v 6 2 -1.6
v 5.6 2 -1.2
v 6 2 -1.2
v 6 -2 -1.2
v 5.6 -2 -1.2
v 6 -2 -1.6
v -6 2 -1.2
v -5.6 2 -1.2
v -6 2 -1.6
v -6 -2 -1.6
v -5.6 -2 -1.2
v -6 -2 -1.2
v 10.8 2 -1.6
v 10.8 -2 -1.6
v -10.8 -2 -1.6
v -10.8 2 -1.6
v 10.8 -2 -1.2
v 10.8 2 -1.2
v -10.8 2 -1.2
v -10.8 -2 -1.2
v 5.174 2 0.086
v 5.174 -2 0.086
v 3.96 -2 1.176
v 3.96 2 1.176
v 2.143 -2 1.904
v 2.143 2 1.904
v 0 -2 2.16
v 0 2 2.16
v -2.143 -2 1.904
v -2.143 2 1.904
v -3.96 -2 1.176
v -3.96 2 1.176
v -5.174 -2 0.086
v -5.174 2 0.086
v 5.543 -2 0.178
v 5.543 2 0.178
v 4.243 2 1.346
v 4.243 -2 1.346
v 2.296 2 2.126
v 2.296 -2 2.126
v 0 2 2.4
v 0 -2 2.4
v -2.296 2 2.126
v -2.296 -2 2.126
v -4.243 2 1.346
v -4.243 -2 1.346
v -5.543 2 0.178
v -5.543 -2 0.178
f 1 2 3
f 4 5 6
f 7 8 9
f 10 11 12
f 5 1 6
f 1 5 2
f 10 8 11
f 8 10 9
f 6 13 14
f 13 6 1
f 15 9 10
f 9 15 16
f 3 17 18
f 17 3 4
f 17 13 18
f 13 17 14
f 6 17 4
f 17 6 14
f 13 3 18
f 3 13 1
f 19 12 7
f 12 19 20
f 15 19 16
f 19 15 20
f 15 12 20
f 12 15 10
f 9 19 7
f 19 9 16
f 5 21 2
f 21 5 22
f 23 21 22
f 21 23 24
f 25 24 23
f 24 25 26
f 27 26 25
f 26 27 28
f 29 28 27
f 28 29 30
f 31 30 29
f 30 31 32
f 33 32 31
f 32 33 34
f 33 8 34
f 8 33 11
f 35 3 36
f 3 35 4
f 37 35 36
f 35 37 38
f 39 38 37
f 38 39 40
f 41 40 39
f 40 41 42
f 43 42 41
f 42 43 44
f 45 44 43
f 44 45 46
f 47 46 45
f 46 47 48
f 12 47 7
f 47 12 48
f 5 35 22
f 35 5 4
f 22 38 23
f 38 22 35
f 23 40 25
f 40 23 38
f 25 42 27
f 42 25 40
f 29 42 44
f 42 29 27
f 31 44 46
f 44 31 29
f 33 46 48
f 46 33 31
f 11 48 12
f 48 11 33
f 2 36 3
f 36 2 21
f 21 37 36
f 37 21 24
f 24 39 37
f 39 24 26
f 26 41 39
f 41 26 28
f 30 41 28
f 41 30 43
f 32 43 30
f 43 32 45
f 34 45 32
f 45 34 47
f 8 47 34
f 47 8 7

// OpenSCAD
// file: ../../p/box4-4a.scad
use <../lib.scad>
function ldraw_lib__box4_4a() = [
// 0 Box with  4 Faces without  4 Adjacent Edges
// 0 Name: box4-4a.dat
// 0 Author: Willy Tschager [Holly-Wood]
// 0 !LDRAW_ORG Primitive UPDATE 2024-01
// 0 !LICENSE Licensed under CC BY 4.0 : see CAreadme.txt
// 
// 0 BFC CERTIFY CCW
  [0,"BFC","CERTIFY"],
  [0,"BFC","CCW"],
// 
// 0 !HISTORY 1998-07-15 [PTadmin] Official Update 1998-07
// 0 !HISTORY 2002-12-13 [hafhead] Made BFC compliant
// 0 !HISTORY 2003-03-12 [PTadmin] Official Update 2003-01
// 0 !HISTORY 2007-06-24 [PTadmin] Header formatted for Contributor Agreement
// 0 !HISTORY 2008-07-01 [PTadmin] Official Update 2008-01
// 0 !HISTORY 2012-02-16 [Philo] Changed to CCW
// 0 !HISTORY 2012-03-30 [PTadmin] Official Update 2012-01
// 0 !HISTORY 2024-01-03 [Holly-Wood] Complete re-write, original by Manfred Moolhuysen
// 0 !HISTORY 2024-01-29 [OrionP] Official Update 2024-01
// 
// 2 24 -1 1 -1 -1 1 1
  [2,24,-1,1,-1,-1,1,1],
// 2 24 1 1 1 1 1 -1
  [2,24,1,1,1,1,1,-1],
// 2 24 -1 1 1 1 1 1
  [2,24,-1,1,1,1,1,1],
// 4 16 1 1 1 1 1 -1 -1 1 -1 -1 1 1
  [4,16,1,1,1,1,1,-1,-1,1,-1,-1,1,1],
// 
// 2 24 -1 0 -1 -1 0 1
  [2,24,-1,0,-1,-1,0,1],
// 4 16 -1 1 1 -1 1 -1 -1 0 -1 -1 0 1
  [4,16,-1,1,1,-1,1,-1,-1,0,-1,-1,0,1],
// 
// 2 24 1 0 1 1 0 -1
  [2,24,1,0,1,1,0,-1],
// 4 16 1 1 -1 1 1 1 1 0 1 1 0 -1
  [4,16,1,1,-1,1,1,1,1,0,1,1,0,-1],
// 
// 2 24 1 1 1 1 0 1
  [2,24,1,1,1,1,0,1],
// 2 24 -1 1 1 -1 0 1
  [2,24,-1,1,1,-1,0,1],
// 2 24 -1 0 1 1 0 1
  [2,24,-1,0,1,1,0,1],
// 4 16 1 1 1 -1 1 1 -1 0 1 1 0 1
  [4,16,1,1,1,-1,1,1,-1,0,1,1,0,1],
];
module ldraw_lib__box4_4a(step=0, col=false, unit=2/5, alt=false, line=0.2, solid=!$preview)
    makepoly(ldraw_lib__box4_4a(), step=step, col=col, unit=unit, alt=alt, line=line, solid=solid);
ldraw_lib__box4_4a(line=0.2);
// file: ../../p/2-4ring14.scad
use <../lib.scad>
function ldraw_lib__2_4ring14() = [
// 0 Ring 14 x 0.5
// 0 Name: 2-4ring14.dat
// 0 Author: Willy Tschager [Holly-Wood]
// 0 !LDRAW_ORG Primitive UPDATE 2024-02
// 0 !LICENSE Licensed under CC BY 4.0 : see CAreadme.txt
// 
// 0 BFC CERTIFY CCW
  [0,"BFC","CERTIFY"],
  [0,"BFC","CCW"],
// 
// 0 !HISTORY 2009-12-29 [PTadmin] Official Update 2009-03
// 0 !HISTORY 2024-01-22 [Holly-Wood] Complete regeneration, original by guyvivan
// 0 !HISTORY 2024-03-24 [OrionP] Official Update 2024-02
// 
// 4 16 15 0 0 13.8585 0 5.7405 12.9346 0 5.3578 14 0 0
  [4,16,15,0,0,13.8585,0,5.7405,12.9346,0,5.3578,14,0,0],
// 4 16 13.8585 0 5.7405 10.6065 0 10.6065 9.8994 0 9.8994 12.9346 0 5.3578
  [4,16,13.8585,0,5.7405,10.6065,0,10.6065,9.8994,0,9.8994,12.9346,0,5.3578],
// 4 16 10.6065 0 10.6065 5.7405 0 13.8585 5.3578 0 12.9346 9.8994 0 9.8994
  [4,16,10.6065,0,10.6065,5.7405,0,13.8585,5.3578,0,12.9346,9.8994,0,9.8994],
// 4 16 5.7405 0 13.8585 0 0 15 0 0 14 5.3578 0 12.9346
  [4,16,5.7405,0,13.8585,0,0,15,0,0,14,5.3578,0,12.9346],
// 4 16 0 0 15 -5.7405 0 13.8585 -5.3578 0 12.9346 0 0 14
  [4,16,0,0,15,-5.7405,0,13.8585,-5.3578,0,12.9346,0,0,14],
// 4 16 -5.7405 0 13.8585 -10.6065 0 10.6065 -9.8994 0 9.8994 -5.3578 0 12.9346
  [4,16,-5.7405,0,13.8585,-10.6065,0,10.6065,-9.8994,0,9.8994,-5.3578,0,12.9346],
// 4 16 -10.6065 0 10.6065 -13.8585 0 5.7405 -12.9346 0 5.3578 -9.8994 0 9.8994
  [4,16,-10.6065,0,10.6065,-13.8585,0,5.7405,-12.9346,0,5.3578,-9.8994,0,9.8994],
// 4 16 -13.8585 0 5.7405 -15 0 0 -14 0 0 -12.9346 0 5.3578
  [4,16,-13.8585,0,5.7405,-15,0,0,-14,0,0,-12.9346,0,5.3578],
// 0 // Build by LDPartEditor (PrimGen 2.X)
];
module ldraw_lib__2_4ring14(step=0, col=false, unit=2/5, alt=false, line=0.2, solid=!$preview)
    makepoly(ldraw_lib__2_4ring14(), step=step, col=col, unit=unit, alt=alt, line=line, solid=solid);
ldraw_lib__2_4ring14(line=0.2);
// file: ../../p/2-4edge.scad
use <../lib.scad>
function ldraw_lib__2_4edge() = [
// 0 Circle 0.5
// 0 Name: 2-4edge.dat
// 0 Author: James Jessiman
// 0 !LDRAW_ORG Primitive UPDATE 2017-01
// 0 !LICENSE Licensed under CC BY 4.0 : see CAreadme.txt
// 
// 0 BFC CERTIFY CCW
  [0,"BFC","CERTIFY"],
  [0,"BFC","CCW"],
// 
// 0 !HISTORY 2007-06-24 [PTadmin] Header formatted for Contributor Agreement
// 0 !HISTORY 2008-07-01 [PTadmin] Official Update 2008-01
// 0 !HISTORY 2017-01-15 [Steffen] BFCed
// 0 !HISTORY 2017-12-30 [PTadmin] Official Update 2017-01
// 
// 
// 2 24 1 0 0 0.9239 0 0.3827
  [2,24,1,0,0,0.9239,0,0.3827],
// 2 24 0.9239 0 0.3827 0.7071 0 0.7071
  [2,24,0.9239,0,0.3827,0.7071,0,0.7071],
// 2 24 0.7071 0 0.7071 0.3827 0 0.9239
  [2,24,0.7071,0,0.7071,0.3827,0,0.9239],
// 2 24 0.3827 0 0.9239 0 0 1
  [2,24,0.3827,0,0.9239,0,0,1],
// 2 24 0 0 1 -0.3827 0 0.9239
  [2,24,0,0,1,-0.3827,0,0.9239],
// 2 24 -0.3827 0 0.9239 -0.7071 0 0.7071
  [2,24,-0.3827,0,0.9239,-0.7071,0,0.7071],
// 2 24 -0.7071 0 0.7071 -0.9239 0 0.3827
  [2,24,-0.7071,0,0.7071,-0.9239,0,0.3827],
// 2 24 -0.9239 0 0.3827 -1 0 0
  [2,24,-0.9239,0,0.3827,-1,0,0],
];
module ldraw_lib__2_4edge(step=0, col=false, unit=2/5, alt=false, line=0.2, solid=!$preview)
    makepoly(ldraw_lib__2_4edge(), step=step, col=col, unit=unit, alt=alt, line=line, solid=solid);
ldraw_lib__2_4edge(line=0.2);
// file: ../../p/2-4cyli.scad
use <../lib.scad>
function ldraw_lib__2_4cyli() = [
// 0 Cylinder 0.5
// 0 Name: 2-4cyli.dat
// 0 Author: James Jessiman
// 0 !LDRAW_ORG Primitive UPDATE 2005-01
// 0 !LICENSE Licensed under CC BY 4.0 : see CAreadme.txt
// 
// 0 BFC CERTIFY CCW
  [0,"BFC","CERTIFY"],
  [0,"BFC","CCW"],
// 
// 0 !HISTORY 2002-03-23 [sbliss] Added BFC statement; compacted code
// 0 !HISTORY 2002-04-25 [PTadmin] Official Update 2002-02
// 0 !HISTORY 2004-12-11 [nielsk] Recreated using Primitive Generator, Edge lines fixed, BFC changed to CCW
// 0 !HISTORY 2005-12-28 [PTadmin] Official Update 2005-01
// 0 !HISTORY 2007-06-24 [PTadmin] Header formatted for Contributor Agreement
// 0 !HISTORY 2008-07-01 [PTadmin] Official Update 2008-01
// 
// 
// 4 16 .9239 1 .3827 .9239 0 .3827 1 0 0 1 1 0
  [4,16,.9239,1,.3827,.9239,0,.3827,1,0,0,1,1,0],
// 4 16 .7071 1 .7071 .7071 0 .7071 .9239 0 .3827 .9239 1 .3827
  [4,16,.7071,1,.7071,.7071,0,.7071,.9239,0,.3827,.9239,1,.3827],
// 4 16 .3827 1 .9239 .3827 0 .9239 .7071 0 .7071 .7071 1 .7071
  [4,16,.3827,1,.9239,.3827,0,.9239,.7071,0,.7071,.7071,1,.7071],
// 4 16 0 1 1 0 0 1 .3827 0 .9239 .3827 1 .9239
  [4,16,0,1,1,0,0,1,.3827,0,.9239,.3827,1,.9239],
// 4 16 -.3827 1 .9239 -.3827 0 .9239 0 0 1 0 1 1
  [4,16,-.3827,1,.9239,-.3827,0,.9239,0,0,1,0,1,1],
// 4 16 -.7071 1 .7071 -.7071 0 .7071 -.3827 0 .9239 -.3827 1 .9239
  [4,16,-.7071,1,.7071,-.7071,0,.7071,-.3827,0,.9239,-.3827,1,.9239],
// 4 16 -.9239 1 .3827 -.9239 0 .3827 -.7071 0 .7071 -.7071 1 .7071
  [4,16,-.9239,1,.3827,-.9239,0,.3827,-.7071,0,.7071,-.7071,1,.7071],
// 4 16 -1 1 0 -1 0 0 -.9239 0 .3827 -.9239 1 .3827
  [4,16,-1,1,0,-1,0,0,-.9239,0,.3827,-.9239,1,.3827],
// 5 24 1 1 0 1 0 0 1 1 -.4142 .9239 1 .3827
  [5,24,1,1,0,1,0,0,1,1,-.4142,.9239,1,.3827],
// 5 24 .9239 1 .3827 .9239 0 .3827 1 1 0 .7071 1 .7071
  [5,24,.9239,1,.3827,.9239,0,.3827,1,1,0,.7071,1,.7071],
// 5 24 .7071 1 .7071 .7071 0 .7071 .9239 1 .3827 .3827 1 .9239
  [5,24,.7071,1,.7071,.7071,0,.7071,.9239,1,.3827,.3827,1,.9239],
// 5 24 .3827 1 .9239 .3827 0 .9239 .7071 1 .7071 0 1 1
  [5,24,.3827,1,.9239,.3827,0,.9239,.7071,1,.7071,0,1,1],
// 5 24 0 1 1 0 0 1 .3827 1 .9239 -.3827 1 .9239
  [5,24,0,1,1,0,0,1,.3827,1,.9239,-.3827,1,.9239],
// 5 24 -.3827 1 .9239 -.3827 0 .9239 0 1 1 -.7071 1 .7071
  [5,24,-.3827,1,.9239,-.3827,0,.9239,0,1,1,-.7071,1,.7071],
// 5 24 -.7071 1 .7071 -.7071 0 .7071 -.3827 1 .9239 -.9239 1 .3827
  [5,24,-.7071,1,.7071,-.7071,0,.7071,-.3827,1,.9239,-.9239,1,.3827],
// 5 24 -.9239 1 .3827 -.9239 0 .3827 -.7071 1 .7071 -1 1 0
  [5,24,-.9239,1,.3827,-.9239,0,.3827,-.7071,1,.7071,-1,1,0],
// 5 24 -1 1 0 -1 0 0 -.9239 1 .3827 -1 1 -.4142
  [5,24,-1,1,0,-1,0,0,-.9239,1,.3827,-1,1,-.4142],
// 0
];
module ldraw_lib__2_4cyli(step=0, col=false, unit=2/5, alt=false, line=0.2, solid=!$preview)
    makepoly(ldraw_lib__2_4cyli(), step=step, col=col, unit=unit, alt=alt, line=line, solid=solid);
ldraw_lib__2_4cyli(line=0.2);
// main file
use <../../lib.scad>
use <../../p/2-4cyli.scad>
use <../../p/2-4edge.scad>
use <../../p/2-4ring14.scad>
use <../../p/box4-4a.scad>
function ldraw_lib__s__511s01() = [
// 0 ~Metal Contact for Electric Train Track Contact Base
// 0 Name: s\511s01.dat
// 0 Author: Niels Karsdorp [nielsk]
// 0 !LDRAW_ORG Subpart UPDATE 2025-09
// 0 !LICENSE Licensed under CC BY 4.0 : see CAreadme.txt
// 
// 0 BFC CERTIFY CCW
  [0,"BFC","CERTIFY"],
  [0,"BFC","CCW"],
// 
// 0 !HISTORY 2012-03-30 [PTadmin] Official Update 2012-01
// 0 !HISTORY 2024-03-23 [OrionP] Updated ring primitives
// 0 !HISTORY 2024-03-24 [OrionP] Official Update 2024-02
// 0 !HISTORY 2025-09-27 [OrionP] Changed winding to CCW
// 0 !HISTORY 2025-09-29 [OrionP] Official Update 2025-09
// 
// 3 16 15 4 5 14 3 5 15 3 5
  [3,16,15,4,5,14,3,5,15,3,5],
// 3 16 15 3 -5 14 3 -5 15 4 -5
  [3,16,15,3,-5,14,3,-5,15,4,-5],
// 3 16 -15 3 5 -14 3 5 -15 4 5
  [3,16,-15,3,5,-14,3,5,-15,4,5],
// 3 16 -15 4 -5 -14 3 -5 -15 3 -5
  [3,16,-15,4,-5,-14,3,-5,-15,3,-5],
// 4 16 15 4 5 15 4 -5 14 3 -5 14 3 5
  [4,16,15,4,5,15,4,-5,14,3,-5,14,3,5],
// 4 16 -14 3 5 -14 3 -5 -15 4 -5 -15 4 5
  [4,16,-14,3,5,-14,3,-5,-15,4,-5,-15,4,5],
// 4 16 15 4 -5 15 4 5 27 4 5 27 4 -5
  [4,16,15,4,-5,15,4,5,27,4,5,27,4,-5],
// 4 16 -27 4 -5 -27 4 5 -15 4 5 -15 4 -5
  [4,16,-27,4,-5,-27,4,5,-15,4,5,-15,4,-5],
// 1 16 21 4 0 0 0 6 0 -1 0 5 0 0 box4-4a.dat
  [1,16,21,4,0,0,0,6,0,-1,0,5,0,0, ldraw_lib__box4_4a()],
// 1 16 -21 4 0 0 0 -6 0 -1 0 5 0 0 box4-4a.dat
  [1,16,-21,4,0,0,0,-6,0,-1,0,5,0,0, ldraw_lib__box4_4a()],
// 0 BFC INVERTNEXT
  [0,"BFC","INVERTNEXT"],
// 1 16 0 3 -5 14 0 0 0 0 -8.4 0 10 0 2-4cyli.dat
  [1,16,0,3,-5,14,0,0,0,0,-8.4,0,10,0, ldraw_lib__2_4cyli()],
// 1 16 0 3 -5 15 0 0 0 0 -9 0 10 0 2-4cyli.dat
  [1,16,0,3,-5,15,0,0,0,0,-9,0,10,0, ldraw_lib__2_4cyli()],
// 1 16 0 3 -5 1 0 0 0 0 -.6 0 1 0 2-4ring14.dat
  [1,16,0,3,-5,1,0,0,0,0,-.6,0,1,0, ldraw_lib__2_4ring14()],
// 1 16 0 3 5 1 0 0 0 0 -.6 0 -1 0 2-4ring14.dat
  [1,16,0,3,5,1,0,0,0,0,-.6,0,-1,0, ldraw_lib__2_4ring14()],
// 1 16 0 3 -5 15 0 0 0 0 -9 0 1 0 2-4edge.dat
  [1,16,0,3,-5,15,0,0,0,0,-9,0,1,0, ldraw_lib__2_4edge()],
// 1 16 0 3 5 15 0 0 0 0 -9 0 1 0 2-4edge.dat
  [1,16,0,3,5,15,0,0,0,0,-9,0,1,0, ldraw_lib__2_4edge()],
// 1 16 0 3 -5 14 0 0 0 0 -8.4 0 1 0 2-4edge.dat
  [1,16,0,3,-5,14,0,0,0,0,-8.4,0,1,0, ldraw_lib__2_4edge()],
// 1 16 0 3 5 14 0 0 0 0 -8.4 0 1 0 2-4edge.dat
  [1,16,0,3,5,14,0,0,0,0,-8.4,0,1,0, ldraw_lib__2_4edge()],
// 2 24 15 3 -5 15 3 5
  [2,24,15,3,-5,15,3,5],
// 2 24 -15 3 -5 -15 3 5
  [2,24,-15,3,-5,-15,3,5],
// 2 24 14 3 -5 14 3 5
  [2,24,14,3,-5,14,3,5],
// 2 24 -14 3 -5 -14 3 5
  [2,24,-14,3,-5,-14,3,5],
// 2 24 15 4 -5 15 4 5
  [2,24,15,4,-5,15,4,5],
// 2 24 -15 4 -5 -15 4 5
  [2,24,-15,4,-5,-15,4,5],
// 2 24 15 4 5 14 3 5
  [2,24,15,4,5,14,3,5],
// 2 24 -15 4 5 -14 3 5
  [2,24,-15,4,5,-14,3,5],
// 2 24 15 4 -5 14 3 -5
  [2,24,15,4,-5,14,3,-5],
// 2 24 -15 4 -5 -14 3 -5
  [2,24,-15,4,-5,-14,3,-5],
// 0
];
module ldraw_lib__s__511s01(step=0, col=false, unit=2/5, alt=false, line=0.2, solid=!$preview)
    makepoly(ldraw_lib__s__511s01(), step=step, col=col, unit=unit, alt=alt, line=line, solid=solid);
ldraw_lib__s__511s01(line=0.2);
